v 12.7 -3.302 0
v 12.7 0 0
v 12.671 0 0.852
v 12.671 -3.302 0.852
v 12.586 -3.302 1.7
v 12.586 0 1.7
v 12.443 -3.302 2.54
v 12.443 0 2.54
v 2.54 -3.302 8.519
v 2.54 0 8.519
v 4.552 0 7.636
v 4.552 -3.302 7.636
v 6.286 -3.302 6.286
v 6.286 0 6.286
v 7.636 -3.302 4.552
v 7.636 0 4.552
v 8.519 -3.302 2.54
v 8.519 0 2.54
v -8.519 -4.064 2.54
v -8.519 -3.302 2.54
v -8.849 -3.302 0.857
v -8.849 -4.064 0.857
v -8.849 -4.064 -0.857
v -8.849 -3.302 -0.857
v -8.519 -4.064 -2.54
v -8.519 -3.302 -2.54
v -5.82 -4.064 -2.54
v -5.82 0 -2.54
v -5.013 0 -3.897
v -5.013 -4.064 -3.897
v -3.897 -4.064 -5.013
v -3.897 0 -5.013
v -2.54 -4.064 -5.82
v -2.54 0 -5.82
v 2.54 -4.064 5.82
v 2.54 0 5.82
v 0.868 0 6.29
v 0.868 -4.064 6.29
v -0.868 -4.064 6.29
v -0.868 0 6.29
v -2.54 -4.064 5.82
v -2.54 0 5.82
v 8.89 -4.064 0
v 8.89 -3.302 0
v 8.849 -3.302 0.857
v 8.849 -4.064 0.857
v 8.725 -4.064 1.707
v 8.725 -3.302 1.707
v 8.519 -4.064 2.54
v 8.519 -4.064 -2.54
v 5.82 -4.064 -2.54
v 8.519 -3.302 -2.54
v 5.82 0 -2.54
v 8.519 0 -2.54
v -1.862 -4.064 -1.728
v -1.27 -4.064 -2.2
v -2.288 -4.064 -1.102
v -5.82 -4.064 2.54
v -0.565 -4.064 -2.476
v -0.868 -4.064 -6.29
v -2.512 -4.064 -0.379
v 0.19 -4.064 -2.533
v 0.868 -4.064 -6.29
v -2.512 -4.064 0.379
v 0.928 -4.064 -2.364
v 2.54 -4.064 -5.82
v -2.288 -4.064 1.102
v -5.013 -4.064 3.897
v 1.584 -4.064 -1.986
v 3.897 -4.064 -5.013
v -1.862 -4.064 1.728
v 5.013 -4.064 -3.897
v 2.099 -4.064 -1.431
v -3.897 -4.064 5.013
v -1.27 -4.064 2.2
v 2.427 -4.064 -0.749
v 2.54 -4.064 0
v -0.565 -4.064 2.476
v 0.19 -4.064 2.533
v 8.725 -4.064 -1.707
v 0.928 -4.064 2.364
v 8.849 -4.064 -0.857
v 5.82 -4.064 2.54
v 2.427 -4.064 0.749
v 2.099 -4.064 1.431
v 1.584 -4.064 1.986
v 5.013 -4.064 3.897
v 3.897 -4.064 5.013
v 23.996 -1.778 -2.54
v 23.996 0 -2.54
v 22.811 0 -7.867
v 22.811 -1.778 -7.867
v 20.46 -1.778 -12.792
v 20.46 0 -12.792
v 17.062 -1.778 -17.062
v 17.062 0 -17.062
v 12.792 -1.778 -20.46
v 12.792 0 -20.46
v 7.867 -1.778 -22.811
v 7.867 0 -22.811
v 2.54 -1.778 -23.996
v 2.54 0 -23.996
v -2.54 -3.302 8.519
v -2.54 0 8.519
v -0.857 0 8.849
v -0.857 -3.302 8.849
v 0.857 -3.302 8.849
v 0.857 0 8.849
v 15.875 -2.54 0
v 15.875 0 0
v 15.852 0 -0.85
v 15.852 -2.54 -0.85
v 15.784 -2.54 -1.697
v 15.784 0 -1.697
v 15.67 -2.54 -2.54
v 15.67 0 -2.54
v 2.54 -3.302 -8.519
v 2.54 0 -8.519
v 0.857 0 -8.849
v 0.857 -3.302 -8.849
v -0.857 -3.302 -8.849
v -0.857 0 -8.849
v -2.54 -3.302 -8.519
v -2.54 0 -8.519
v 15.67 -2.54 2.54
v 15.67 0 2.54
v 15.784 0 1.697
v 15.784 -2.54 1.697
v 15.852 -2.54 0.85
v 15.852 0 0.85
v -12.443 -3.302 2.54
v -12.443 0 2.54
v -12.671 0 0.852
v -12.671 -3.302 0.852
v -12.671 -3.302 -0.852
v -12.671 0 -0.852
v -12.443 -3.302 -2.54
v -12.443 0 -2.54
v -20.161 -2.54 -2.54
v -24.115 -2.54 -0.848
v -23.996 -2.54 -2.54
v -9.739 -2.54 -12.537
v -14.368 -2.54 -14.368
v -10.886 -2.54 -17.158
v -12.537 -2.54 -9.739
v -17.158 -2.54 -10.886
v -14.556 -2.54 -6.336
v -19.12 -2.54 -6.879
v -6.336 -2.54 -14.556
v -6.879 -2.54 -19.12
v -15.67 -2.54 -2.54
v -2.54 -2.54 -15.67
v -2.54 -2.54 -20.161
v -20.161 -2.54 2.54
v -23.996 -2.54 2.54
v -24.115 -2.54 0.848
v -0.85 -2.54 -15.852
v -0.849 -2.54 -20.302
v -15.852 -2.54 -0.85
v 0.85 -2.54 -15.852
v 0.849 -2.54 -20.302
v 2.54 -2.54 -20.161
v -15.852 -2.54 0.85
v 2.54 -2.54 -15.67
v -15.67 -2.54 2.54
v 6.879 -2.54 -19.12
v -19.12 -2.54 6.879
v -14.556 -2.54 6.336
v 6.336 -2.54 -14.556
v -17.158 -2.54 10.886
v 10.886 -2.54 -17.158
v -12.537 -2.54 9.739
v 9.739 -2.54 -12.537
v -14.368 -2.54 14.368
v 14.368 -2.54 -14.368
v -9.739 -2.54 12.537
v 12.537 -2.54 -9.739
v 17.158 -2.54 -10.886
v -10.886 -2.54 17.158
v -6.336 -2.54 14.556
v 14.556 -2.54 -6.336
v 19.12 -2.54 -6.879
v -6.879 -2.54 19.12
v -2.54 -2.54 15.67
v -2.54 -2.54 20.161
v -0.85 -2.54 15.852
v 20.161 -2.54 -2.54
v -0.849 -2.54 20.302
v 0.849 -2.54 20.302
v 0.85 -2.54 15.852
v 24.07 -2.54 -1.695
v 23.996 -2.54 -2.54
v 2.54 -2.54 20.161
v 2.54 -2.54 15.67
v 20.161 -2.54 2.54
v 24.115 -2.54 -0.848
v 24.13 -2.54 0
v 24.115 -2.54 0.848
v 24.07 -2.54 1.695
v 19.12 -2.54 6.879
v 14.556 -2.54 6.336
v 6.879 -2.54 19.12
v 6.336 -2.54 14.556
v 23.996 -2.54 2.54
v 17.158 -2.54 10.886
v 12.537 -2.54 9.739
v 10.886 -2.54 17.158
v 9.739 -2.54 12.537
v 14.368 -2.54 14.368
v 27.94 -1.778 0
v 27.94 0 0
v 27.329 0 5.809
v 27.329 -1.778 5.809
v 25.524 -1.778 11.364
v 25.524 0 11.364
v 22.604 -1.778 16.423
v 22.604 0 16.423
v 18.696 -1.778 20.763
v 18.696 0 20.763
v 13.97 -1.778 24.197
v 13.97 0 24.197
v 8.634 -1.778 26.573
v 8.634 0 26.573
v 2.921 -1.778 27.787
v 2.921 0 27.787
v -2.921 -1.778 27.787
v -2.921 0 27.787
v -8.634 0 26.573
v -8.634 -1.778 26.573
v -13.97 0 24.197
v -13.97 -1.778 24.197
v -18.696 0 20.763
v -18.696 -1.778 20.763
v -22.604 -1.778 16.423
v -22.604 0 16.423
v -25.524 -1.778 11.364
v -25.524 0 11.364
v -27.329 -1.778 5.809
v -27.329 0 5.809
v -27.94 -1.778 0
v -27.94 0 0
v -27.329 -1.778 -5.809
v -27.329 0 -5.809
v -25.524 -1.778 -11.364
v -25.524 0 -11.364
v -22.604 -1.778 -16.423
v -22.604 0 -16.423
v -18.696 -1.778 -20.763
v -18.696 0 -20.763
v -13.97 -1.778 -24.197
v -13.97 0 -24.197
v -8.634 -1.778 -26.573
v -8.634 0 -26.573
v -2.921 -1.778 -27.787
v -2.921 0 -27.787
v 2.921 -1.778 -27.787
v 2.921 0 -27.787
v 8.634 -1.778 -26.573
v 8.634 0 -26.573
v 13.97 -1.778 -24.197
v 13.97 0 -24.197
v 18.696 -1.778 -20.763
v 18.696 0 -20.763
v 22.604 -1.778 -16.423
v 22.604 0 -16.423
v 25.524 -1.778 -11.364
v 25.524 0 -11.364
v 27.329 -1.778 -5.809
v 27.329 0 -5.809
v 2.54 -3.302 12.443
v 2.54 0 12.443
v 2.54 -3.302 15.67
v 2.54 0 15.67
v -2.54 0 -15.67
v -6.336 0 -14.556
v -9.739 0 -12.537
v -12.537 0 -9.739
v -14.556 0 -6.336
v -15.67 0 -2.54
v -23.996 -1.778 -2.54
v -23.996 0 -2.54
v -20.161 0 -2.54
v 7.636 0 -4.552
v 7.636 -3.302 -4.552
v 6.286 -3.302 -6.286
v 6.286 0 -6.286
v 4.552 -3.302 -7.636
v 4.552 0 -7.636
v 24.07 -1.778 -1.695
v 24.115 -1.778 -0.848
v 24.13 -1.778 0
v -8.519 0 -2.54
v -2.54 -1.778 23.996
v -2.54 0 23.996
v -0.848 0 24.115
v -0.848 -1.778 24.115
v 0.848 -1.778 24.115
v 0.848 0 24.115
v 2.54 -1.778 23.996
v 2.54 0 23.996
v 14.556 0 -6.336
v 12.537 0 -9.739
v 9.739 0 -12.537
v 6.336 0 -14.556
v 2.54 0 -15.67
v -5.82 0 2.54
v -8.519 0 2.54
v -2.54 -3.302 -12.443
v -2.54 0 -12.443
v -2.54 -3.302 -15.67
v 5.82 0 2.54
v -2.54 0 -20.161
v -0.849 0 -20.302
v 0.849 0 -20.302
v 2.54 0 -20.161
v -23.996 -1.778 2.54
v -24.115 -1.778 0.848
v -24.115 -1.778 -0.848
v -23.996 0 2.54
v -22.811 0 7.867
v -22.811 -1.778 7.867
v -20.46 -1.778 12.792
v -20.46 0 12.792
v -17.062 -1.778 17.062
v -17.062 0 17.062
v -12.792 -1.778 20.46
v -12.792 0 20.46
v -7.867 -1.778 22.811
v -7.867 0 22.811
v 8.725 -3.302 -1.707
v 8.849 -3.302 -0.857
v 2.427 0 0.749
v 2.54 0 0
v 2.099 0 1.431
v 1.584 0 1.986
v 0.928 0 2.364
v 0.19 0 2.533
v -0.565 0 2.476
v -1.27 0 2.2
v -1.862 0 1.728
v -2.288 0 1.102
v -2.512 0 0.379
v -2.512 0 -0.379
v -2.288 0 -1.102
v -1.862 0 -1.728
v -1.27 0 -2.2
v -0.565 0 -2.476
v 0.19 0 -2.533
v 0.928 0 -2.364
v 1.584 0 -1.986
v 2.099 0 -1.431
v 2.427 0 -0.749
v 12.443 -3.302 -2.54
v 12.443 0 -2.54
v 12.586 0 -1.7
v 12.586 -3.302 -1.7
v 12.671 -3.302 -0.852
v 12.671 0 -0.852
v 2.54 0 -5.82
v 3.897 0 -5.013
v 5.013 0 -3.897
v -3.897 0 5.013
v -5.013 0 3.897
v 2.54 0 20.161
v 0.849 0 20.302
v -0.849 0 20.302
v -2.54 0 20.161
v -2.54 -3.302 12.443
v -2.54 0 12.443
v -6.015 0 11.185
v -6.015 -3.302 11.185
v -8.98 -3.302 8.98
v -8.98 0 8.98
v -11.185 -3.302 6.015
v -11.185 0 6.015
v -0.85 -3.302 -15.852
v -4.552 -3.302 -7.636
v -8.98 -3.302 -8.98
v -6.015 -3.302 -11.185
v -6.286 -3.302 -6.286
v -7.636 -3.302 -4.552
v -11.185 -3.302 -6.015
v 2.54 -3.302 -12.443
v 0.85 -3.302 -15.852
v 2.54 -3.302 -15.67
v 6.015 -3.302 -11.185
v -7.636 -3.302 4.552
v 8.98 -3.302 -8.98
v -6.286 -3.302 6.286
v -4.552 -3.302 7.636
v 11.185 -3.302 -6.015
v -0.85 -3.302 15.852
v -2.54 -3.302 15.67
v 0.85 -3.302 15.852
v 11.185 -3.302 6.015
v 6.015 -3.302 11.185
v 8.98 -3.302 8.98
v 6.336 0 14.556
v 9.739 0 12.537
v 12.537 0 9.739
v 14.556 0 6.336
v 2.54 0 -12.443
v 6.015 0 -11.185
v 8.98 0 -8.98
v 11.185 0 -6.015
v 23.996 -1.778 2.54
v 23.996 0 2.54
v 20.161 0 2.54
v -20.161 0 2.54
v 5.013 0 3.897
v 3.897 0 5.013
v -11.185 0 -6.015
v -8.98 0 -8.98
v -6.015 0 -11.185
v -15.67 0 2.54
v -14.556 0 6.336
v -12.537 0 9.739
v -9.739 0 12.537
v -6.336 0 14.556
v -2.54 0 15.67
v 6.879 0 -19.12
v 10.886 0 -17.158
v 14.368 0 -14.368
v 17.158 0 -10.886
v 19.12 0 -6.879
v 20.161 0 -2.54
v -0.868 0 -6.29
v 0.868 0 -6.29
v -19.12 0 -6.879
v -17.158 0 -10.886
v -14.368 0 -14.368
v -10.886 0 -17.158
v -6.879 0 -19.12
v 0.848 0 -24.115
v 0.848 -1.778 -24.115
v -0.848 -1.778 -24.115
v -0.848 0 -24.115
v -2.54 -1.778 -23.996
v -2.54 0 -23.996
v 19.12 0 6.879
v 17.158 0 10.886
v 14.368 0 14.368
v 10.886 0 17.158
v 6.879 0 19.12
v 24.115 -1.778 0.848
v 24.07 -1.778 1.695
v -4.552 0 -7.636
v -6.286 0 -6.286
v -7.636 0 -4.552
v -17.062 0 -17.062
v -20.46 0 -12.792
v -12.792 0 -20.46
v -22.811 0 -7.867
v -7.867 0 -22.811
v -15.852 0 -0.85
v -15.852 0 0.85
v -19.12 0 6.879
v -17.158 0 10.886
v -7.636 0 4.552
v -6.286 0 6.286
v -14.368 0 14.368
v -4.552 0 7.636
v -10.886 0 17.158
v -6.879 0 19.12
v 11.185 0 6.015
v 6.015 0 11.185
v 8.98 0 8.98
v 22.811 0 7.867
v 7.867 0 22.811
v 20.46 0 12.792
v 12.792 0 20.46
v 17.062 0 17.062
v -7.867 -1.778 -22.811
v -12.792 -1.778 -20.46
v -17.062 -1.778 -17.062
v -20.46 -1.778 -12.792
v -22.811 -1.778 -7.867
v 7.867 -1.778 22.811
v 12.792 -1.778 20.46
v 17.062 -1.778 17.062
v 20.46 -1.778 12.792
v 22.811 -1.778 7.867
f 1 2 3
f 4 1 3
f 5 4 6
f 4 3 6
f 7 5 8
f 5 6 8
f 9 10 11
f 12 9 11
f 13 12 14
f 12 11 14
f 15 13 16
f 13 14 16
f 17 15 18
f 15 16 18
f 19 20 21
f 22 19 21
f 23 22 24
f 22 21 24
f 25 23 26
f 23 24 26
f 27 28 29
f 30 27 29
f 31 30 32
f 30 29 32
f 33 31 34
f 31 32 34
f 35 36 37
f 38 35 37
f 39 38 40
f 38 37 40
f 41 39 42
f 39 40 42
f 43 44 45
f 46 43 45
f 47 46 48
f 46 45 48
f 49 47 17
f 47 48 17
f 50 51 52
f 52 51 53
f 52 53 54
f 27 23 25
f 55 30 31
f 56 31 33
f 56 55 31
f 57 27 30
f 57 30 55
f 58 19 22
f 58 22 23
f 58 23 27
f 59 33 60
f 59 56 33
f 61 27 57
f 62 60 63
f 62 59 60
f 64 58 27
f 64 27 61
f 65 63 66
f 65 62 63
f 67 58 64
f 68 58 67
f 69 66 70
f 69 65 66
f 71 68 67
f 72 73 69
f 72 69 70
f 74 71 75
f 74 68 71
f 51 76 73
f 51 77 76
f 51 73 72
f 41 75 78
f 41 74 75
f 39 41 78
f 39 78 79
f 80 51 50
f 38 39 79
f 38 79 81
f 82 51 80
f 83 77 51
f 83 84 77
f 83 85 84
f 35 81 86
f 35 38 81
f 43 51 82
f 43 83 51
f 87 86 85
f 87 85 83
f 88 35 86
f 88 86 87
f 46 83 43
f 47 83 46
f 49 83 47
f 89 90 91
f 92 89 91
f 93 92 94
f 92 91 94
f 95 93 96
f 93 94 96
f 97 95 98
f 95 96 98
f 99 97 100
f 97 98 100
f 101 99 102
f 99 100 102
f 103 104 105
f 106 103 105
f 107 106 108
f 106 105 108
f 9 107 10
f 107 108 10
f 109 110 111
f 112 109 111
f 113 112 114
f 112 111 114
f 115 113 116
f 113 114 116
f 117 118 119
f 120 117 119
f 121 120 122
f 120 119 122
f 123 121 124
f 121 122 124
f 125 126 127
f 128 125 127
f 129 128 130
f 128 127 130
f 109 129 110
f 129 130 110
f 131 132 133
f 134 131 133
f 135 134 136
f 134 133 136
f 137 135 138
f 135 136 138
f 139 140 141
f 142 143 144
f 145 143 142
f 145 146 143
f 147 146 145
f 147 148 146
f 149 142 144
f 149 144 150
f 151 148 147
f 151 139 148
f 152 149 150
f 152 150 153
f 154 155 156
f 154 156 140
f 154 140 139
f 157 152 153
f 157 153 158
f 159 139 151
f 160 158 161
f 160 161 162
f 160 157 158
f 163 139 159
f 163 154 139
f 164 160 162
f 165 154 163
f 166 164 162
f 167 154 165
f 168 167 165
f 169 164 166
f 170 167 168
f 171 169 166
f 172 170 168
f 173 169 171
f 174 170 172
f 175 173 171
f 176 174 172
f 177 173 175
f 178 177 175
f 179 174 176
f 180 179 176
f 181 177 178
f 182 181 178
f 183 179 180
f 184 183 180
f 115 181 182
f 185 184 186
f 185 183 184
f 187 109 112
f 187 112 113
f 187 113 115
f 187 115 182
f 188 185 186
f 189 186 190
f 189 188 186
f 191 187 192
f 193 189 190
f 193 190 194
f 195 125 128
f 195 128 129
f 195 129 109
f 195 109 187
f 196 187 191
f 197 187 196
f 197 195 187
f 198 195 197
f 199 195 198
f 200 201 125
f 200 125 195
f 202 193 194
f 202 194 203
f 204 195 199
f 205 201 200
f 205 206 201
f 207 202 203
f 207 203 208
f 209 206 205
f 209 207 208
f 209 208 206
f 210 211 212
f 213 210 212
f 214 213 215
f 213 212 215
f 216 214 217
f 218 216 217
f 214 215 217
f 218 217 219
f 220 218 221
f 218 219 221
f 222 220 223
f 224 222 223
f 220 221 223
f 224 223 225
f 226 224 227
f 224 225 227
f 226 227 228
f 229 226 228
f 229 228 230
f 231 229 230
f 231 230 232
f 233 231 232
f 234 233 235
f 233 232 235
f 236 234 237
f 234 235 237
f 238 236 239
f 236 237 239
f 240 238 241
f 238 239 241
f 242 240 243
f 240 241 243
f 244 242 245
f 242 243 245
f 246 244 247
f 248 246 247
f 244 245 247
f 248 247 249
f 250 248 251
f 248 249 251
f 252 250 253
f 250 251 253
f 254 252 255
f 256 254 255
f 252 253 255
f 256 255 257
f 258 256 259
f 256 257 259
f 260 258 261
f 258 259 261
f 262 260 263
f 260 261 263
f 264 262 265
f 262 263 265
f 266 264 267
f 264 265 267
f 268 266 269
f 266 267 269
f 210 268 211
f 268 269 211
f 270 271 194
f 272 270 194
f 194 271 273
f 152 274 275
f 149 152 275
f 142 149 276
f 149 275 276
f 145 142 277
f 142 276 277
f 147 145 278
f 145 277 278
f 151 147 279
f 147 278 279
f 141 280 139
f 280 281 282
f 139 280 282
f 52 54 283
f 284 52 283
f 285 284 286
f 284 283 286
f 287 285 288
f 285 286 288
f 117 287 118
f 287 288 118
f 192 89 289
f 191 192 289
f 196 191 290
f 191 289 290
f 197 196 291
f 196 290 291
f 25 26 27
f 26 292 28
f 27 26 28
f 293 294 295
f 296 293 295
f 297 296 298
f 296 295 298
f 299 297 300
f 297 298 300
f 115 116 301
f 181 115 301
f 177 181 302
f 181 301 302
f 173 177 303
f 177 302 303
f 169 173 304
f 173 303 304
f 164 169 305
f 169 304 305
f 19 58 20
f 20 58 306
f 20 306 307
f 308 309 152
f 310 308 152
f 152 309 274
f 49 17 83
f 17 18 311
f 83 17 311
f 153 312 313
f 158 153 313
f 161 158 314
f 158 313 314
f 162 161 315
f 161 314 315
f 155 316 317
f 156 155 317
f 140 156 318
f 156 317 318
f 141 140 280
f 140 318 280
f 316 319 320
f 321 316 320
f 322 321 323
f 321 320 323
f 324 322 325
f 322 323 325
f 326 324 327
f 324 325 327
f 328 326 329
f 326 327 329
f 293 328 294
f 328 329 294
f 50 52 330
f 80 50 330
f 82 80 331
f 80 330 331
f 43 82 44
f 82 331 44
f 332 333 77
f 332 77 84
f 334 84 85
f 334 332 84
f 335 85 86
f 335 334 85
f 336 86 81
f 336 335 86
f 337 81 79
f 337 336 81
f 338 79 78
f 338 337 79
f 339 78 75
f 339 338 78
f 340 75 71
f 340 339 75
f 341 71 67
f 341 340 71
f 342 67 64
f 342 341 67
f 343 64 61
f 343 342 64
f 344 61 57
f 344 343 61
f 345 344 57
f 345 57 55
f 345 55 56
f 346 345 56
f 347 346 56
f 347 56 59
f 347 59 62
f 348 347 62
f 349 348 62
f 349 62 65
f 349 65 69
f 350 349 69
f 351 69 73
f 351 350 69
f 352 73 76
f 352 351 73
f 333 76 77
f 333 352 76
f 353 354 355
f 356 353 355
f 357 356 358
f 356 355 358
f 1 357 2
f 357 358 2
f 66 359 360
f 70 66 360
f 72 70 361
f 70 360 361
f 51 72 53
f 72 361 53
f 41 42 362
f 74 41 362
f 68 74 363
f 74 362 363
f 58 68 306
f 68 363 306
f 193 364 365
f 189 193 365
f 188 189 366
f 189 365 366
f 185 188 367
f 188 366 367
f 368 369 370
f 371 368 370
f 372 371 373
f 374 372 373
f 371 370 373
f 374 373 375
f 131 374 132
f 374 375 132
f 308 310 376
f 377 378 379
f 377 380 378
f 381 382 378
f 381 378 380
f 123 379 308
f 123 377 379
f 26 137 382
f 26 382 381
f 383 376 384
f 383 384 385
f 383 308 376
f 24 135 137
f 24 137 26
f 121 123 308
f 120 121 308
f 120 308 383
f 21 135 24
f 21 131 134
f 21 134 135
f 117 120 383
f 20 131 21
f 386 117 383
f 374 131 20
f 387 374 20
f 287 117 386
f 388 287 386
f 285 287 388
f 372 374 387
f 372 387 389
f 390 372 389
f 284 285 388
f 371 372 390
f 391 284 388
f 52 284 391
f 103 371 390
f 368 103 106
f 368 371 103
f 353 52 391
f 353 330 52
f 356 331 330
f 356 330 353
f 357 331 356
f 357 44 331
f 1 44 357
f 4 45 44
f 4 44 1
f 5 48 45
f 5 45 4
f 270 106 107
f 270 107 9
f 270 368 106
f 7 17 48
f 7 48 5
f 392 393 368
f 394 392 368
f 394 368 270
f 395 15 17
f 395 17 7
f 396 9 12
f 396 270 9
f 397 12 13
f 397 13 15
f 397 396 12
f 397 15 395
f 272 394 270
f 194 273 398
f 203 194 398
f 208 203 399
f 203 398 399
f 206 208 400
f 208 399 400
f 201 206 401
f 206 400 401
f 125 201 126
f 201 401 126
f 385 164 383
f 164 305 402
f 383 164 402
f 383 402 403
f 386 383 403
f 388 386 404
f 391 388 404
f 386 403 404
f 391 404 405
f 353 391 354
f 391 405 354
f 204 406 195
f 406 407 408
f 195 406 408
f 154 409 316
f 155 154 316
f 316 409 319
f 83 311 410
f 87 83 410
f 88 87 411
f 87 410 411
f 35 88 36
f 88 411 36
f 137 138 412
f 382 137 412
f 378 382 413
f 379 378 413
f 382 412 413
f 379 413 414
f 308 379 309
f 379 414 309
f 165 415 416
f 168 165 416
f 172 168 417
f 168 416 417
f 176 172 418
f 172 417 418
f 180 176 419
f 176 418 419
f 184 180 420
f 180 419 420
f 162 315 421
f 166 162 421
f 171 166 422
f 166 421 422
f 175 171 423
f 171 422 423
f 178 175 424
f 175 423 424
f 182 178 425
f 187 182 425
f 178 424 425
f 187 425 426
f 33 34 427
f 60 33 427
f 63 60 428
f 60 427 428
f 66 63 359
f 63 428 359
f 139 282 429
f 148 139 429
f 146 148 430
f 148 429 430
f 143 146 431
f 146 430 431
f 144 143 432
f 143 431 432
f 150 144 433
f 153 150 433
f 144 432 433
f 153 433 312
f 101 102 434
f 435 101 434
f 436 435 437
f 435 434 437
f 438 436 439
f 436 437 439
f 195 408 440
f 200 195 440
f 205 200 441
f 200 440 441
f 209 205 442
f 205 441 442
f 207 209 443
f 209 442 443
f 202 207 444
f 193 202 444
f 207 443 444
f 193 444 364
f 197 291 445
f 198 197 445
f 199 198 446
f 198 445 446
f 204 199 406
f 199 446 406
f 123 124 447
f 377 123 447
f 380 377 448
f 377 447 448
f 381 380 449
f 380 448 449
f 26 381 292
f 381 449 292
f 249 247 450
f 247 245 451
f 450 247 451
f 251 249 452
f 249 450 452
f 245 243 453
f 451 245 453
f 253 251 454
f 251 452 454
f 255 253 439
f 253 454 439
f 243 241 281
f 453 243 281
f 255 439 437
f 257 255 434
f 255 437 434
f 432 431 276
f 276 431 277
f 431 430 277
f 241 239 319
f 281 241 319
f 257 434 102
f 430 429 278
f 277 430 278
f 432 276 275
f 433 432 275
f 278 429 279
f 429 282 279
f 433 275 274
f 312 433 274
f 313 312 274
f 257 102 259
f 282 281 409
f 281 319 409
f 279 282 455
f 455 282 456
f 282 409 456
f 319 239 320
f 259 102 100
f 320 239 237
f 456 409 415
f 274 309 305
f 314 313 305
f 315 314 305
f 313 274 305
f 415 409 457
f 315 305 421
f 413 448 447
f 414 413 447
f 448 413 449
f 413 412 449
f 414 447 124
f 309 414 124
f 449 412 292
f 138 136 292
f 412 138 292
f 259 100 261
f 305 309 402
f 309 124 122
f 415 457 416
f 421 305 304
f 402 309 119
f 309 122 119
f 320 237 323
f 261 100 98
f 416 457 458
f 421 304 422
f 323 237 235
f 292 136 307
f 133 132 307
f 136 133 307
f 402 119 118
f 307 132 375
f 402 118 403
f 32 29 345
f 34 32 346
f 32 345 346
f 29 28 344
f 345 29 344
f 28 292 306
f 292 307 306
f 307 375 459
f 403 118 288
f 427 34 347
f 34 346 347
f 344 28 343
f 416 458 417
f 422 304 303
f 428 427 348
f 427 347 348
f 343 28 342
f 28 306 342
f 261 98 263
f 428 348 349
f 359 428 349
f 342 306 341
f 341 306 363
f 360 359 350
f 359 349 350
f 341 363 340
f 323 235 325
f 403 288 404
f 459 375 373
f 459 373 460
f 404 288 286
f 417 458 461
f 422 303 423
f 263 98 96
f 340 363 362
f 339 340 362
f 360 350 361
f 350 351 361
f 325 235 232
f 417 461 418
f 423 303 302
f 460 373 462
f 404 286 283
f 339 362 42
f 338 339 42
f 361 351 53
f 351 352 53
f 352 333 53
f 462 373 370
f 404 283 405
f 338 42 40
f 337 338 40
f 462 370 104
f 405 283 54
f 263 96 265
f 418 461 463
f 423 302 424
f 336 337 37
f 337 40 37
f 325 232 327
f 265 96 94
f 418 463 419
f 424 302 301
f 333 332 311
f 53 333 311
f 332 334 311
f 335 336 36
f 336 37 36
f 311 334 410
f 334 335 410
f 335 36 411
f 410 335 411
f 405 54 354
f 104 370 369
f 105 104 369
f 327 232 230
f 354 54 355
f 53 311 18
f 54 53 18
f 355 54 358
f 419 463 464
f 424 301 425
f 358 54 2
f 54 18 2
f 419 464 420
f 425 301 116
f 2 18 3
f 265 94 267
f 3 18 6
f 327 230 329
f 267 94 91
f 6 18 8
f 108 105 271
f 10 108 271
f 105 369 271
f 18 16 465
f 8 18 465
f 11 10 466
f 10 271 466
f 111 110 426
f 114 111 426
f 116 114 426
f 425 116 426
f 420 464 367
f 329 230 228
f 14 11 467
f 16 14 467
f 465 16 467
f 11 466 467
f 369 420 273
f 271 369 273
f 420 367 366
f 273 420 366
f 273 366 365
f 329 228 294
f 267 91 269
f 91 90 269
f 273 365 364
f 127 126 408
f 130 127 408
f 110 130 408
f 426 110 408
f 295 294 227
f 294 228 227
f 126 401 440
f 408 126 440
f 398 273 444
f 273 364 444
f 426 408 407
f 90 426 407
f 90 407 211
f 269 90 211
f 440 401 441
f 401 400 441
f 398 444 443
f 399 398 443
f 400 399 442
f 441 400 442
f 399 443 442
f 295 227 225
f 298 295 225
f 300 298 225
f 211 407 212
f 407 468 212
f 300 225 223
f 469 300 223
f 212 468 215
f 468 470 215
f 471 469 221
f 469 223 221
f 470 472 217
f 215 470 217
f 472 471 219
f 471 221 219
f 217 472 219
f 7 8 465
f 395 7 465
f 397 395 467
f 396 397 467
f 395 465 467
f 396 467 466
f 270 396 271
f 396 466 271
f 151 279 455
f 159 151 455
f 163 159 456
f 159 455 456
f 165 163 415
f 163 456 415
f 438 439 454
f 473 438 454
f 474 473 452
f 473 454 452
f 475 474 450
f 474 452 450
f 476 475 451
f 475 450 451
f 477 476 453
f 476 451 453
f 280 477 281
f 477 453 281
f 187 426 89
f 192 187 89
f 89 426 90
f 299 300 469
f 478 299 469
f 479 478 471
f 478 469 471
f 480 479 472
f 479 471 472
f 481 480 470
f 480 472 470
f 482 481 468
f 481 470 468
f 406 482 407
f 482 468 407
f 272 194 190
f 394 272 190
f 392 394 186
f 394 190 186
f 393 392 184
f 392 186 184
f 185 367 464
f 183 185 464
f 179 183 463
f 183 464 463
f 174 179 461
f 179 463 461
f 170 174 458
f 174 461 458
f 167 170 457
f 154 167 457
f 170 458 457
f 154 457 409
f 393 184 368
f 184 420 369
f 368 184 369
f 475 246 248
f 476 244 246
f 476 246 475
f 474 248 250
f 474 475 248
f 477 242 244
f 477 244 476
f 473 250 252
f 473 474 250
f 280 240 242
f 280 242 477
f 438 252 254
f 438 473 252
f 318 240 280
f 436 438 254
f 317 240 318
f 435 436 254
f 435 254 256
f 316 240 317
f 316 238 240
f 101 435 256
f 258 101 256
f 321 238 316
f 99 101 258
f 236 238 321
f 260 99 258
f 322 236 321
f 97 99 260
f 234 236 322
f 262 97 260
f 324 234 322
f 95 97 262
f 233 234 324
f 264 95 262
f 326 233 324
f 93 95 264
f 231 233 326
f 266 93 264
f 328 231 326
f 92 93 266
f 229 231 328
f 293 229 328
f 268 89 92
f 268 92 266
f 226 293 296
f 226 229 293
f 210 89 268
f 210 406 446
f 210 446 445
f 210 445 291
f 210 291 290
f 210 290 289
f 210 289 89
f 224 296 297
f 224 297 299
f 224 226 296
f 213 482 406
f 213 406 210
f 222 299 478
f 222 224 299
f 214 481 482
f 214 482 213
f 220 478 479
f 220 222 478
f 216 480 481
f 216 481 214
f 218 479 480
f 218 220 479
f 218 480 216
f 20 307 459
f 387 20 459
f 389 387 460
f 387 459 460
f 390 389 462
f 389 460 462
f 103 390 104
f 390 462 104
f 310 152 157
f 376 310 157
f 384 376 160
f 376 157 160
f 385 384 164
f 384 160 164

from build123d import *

# Parameters (mm, degrees)
F0_R     = 2.54
F1_DEPTH = 4.064
F2_DEPTH = 3.302
F3_DEPTH = 2.54
F0_R_2   = 27.94
F4_DEPTH = 1.778


with BuildPart() as f1:
    # F0 (on Front) → F1 (new body)
    with BuildSketch(Plane.XZ):
        with BuildLine():
            ThreePointArc((5.819871, -2.54), (6.216055, -1.297366), (6.35, 0))
            ThreePointArc((6.35, 0), (6.216055, 1.297366), (5.819871, 2.54))
            ThreePointArc((5.819871, 2.54), (4.490128, 4.490128), (2.54, 5.819871))
            ThreePointArc((2.54, 5.819871), (0, 6.35), (-2.54, 5.819871))
            ThreePointArc((-2.54, 5.819871), (-4.490128, 4.490128), (-5.819871, 2.54))
            ThreePointArc((-5.819871, 2.54), (-6.35, 0), (-5.819871, -2.54))
            ThreePointArc((-5.819871, -2.54), (-4.490128, -4.490128), (-2.54, -5.819871))
            ThreePointArc((-2.54, -5.819871), (0, -6.35), (2.54, -5.819871))
            ThreePointArc((2.54, -5.819871), (4.490128, -4.490128), (5.819871, -2.54))
        make_face()
        Circle(F0_R, mode=Mode.SUBTRACT)
        with BuildLine():
            ThreePointArc((-5.819871, -2.54), (-6.35, 0), (-5.819871, 2.54))
            Line((-5.819871, 2.54), (-8.519419, 2.54))
            ThreePointArc((-8.519419, 2.54), (-8.89, 0), (-8.519419, -2.54))
            Line((-8.519419, -2.54), (-5.819871, -2.54))
        make_face()
        with BuildLine():
            ThreePointArc((5.819871, 2.54), (6.216055, 1.297366), (6.35, 0))
            ThreePointArc((6.35, 0), (6.216055, -1.297366), (5.819871, -2.54))
            Line((5.819871, -2.54), (8.519419, -2.54))
            ThreePointArc((8.519419, -2.54), (8.796867, -1.283446), (8.89, 0))
            ThreePointArc((8.89, 0), (8.796867, 1.283446), (8.519419, 2.54))
            Line((8.519419, 2.54), (5.819871, 2.54))
        make_face()
    extrude(amount=F1_DEPTH)

    # F0 (on Front) → F2 (join)
    with BuildSketch(Plane.XZ):
        with BuildLine():
            ThreePointArc((12.443408, -2.54), (12.635689, -1.276464), (12.7, 0))
            ThreePointArc((12.7, 0), (12.635689, 1.276464), (12.443408, 2.54))
            ThreePointArc((12.443408, 2.54), (8.980256, 8.980256), (2.54, 12.443408))
            ThreePointArc((2.54, 12.443408), (0, 12.7), (-2.54, 12.443408))
            ThreePointArc((-2.54, 12.443408), (-8.980256, 8.980256), (-12.443408, 2.54))
            ThreePointArc((-12.443408, 2.54), (-12.7, 0), (-12.443408, -2.54))
            ThreePointArc((-12.443408, -2.54), (-8.980256, -8.980256), (-2.54, -12.443408))
            ThreePointArc((-2.54, -12.443408), (0, -12.7), (2.54, -12.443408))
            ThreePointArc((2.54, -12.443408), (8.980256, -8.980256), (12.443408, -2.54))
        make_face()
        with BuildLine():
            ThreePointArc((2.54, 8.519419), (6.286179, 6.286179), (8.519419, 2.54))
            ThreePointArc((8.519419, 2.54), (8.796867, 1.283446), (8.89, 0))
            ThreePointArc((8.89, 0), (8.796867, -1.283446), (8.519419, -2.54))
            ThreePointArc((8.519419, -2.54), (6.286179, -6.286179), (2.54, -8.519419))
            ThreePointArc((2.54, -8.519419), (0, -8.89), (-2.54, -8.519419))
            ThreePointArc((-2.54, -8.519419), (-6.286179, -6.286179), (-8.519419, -2.54))
            ThreePointArc((-8.519419, -2.54), (-8.89, 0), (-8.519419, 2.54))
            ThreePointArc((-8.519419, 2.54), (-6.286179, 6.286179), (-2.54, 8.519419))
            ThreePointArc((-2.54, 8.519419), (0, 8.89), (2.54, 8.519419))
        make_face(mode=Mode.SUBTRACT)
        with BuildLine():
            Line((2.54, -15.670483), (2.54, -12.443408))
            ThreePointArc((2.54, -12.443408), (0, -12.7), (-2.54, -12.443408))
            Line((-2.54, -12.443408), (-2.54, -15.670483))
            ThreePointArc((-2.54, -15.670483), (0, -15.875), (2.54, -15.670483))
        make_face()
        with BuildLine():
            ThreePointArc((-2.54, 12.443408), (0, 12.7), (2.54, 12.443408))
            Line((2.54, 12.443408), (2.54, 15.670483))
            ThreePointArc((2.54, 15.670483), (0, 15.875), (-2.54, 15.670483))
            Line((-2.54, 15.670483), (-2.54, 12.443408))
        make_face()
    extrude(amount=F2_DEPTH)

    # F0 (on Front) → F3 (join)
    with BuildSketch(Plane.XZ):
        with BuildLine():
            ThreePointArc((20.160625, -2.54), (20.280117, -1.272498), (20.32, 0))
            ThreePointArc((20.32, 0), (20.280117, 1.272498), (20.160625, 2.54))
            ThreePointArc((20.160625, 2.54), (14.36841, 14.36841), (2.54, 20.160625))
            ThreePointArc((2.54, 20.160625), (0, 20.32), (-2.54, 20.160625))
            ThreePointArc((-2.54, 20.160625), (-14.36841, 14.36841), (-20.160625, 2.54))
            ThreePointArc((-20.160625, 2.54), (-20.32, 0), (-20.160625, -2.54))
            ThreePointArc((-20.160625, -2.54), (-14.36841, -14.36841), (-2.54, -20.160625))
            ThreePointArc((-2.54, -20.160625), (0, -20.32), (2.54, -20.160625))
            ThreePointArc((2.54, -20.160625), (14.36841, -14.36841), (20.160625, -2.54))
        make_face()
        with BuildLine():
            ThreePointArc((2.54, 15.670483), (11.22532, 11.22532), (15.670483, 2.54))
            ThreePointArc((15.670483, 2.54), (15.823788, 1.27411), (15.875, 0))
            ThreePointArc((15.875, 0), (15.823788, -1.27411), (15.670483, -2.54))
            ThreePointArc((15.670483, -2.54), (11.22532, -11.22532), (2.54, -15.670483))
            ThreePointArc((2.54, -15.670483), (0, -15.875), (-2.54, -15.670483))
            ThreePointArc((-2.54, -15.670483), (-11.22532, -11.22532), (-15.670483, -2.54))
            ThreePointArc((-15.670483, -2.54), (-15.875, 0), (-15.670483, 2.54))
            ThreePointArc((-15.670483, 2.54), (-11.22532, 11.22532), (-2.54, 15.670483))
            ThreePointArc((-2.54, 15.670483), (0, 15.875), (2.54, 15.670483))
        make_face(mode=Mode.SUBTRACT)
        with BuildLine():
            ThreePointArc((20.160625, 2.54), (20.280117, 1.272498), (20.32, 0))
            ThreePointArc((20.32, 0), (20.280117, -1.272498), (20.160625, -2.54))
            Line((20.160625, -2.54), (23.995943, -2.54))
            ThreePointArc((23.995943, -2.54), (24.096463, -1.271768), (24.13, 0))
            ThreePointArc((24.13, 0), (24.096463, 1.271768), (23.995943, 2.54))
            Line((23.995943, 2.54), (20.160625, 2.54))
        make_face()
        with BuildLine():
            ThreePointArc((-20.160625, -2.54), (-20.32, 0), (-20.160625, 2.54))
            Line((-20.160625, 2.54), (-23.995943, 2.54))
            ThreePointArc((-23.995943, 2.54), (-24.13, 0), (-23.995943, -2.54))
            Line((-23.995943, -2.54), (-20.160625, -2.54))
        make_face()
    extrude(amount=F3_DEPTH)

    # F0 (on Front) → F4 (join)
    with BuildSketch(Plane.XZ):
        Circle(F0_R_2)
        with BuildLine():
            ThreePointArc((2.54, 23.995943), (17.062487, 17.062487), (23.995943, 2.54))
            ThreePointArc((23.995943, 2.54), (24.096463, 1.271768), (24.13, 0))
            ThreePointArc((24.13, 0), (24.096463, -1.271768), (23.995943, -2.54))
            ThreePointArc((23.995943, -2.54), (17.062487, -17.062487), (2.54, -23.995943))
            ThreePointArc((2.54, -23.995943), (0, -24.13), (-2.54, -23.995943))
            ThreePointArc((-2.54, -23.995943), (-17.062487, -17.062487), (-23.995943, -2.54))
            ThreePointArc((-23.995943, -2.54), (-24.13, 0), (-23.995943, 2.54))
            ThreePointArc((-23.995943, 2.54), (-17.062487, 17.062487), (-2.54, 23.995943))
            ThreePointArc((-2.54, 23.995943), (0, 24.13), (2.54, 23.995943))
        make_face(mode=Mode.SUBTRACT)
    extrude(amount=F4_DEPTH)


solid = f1.part
